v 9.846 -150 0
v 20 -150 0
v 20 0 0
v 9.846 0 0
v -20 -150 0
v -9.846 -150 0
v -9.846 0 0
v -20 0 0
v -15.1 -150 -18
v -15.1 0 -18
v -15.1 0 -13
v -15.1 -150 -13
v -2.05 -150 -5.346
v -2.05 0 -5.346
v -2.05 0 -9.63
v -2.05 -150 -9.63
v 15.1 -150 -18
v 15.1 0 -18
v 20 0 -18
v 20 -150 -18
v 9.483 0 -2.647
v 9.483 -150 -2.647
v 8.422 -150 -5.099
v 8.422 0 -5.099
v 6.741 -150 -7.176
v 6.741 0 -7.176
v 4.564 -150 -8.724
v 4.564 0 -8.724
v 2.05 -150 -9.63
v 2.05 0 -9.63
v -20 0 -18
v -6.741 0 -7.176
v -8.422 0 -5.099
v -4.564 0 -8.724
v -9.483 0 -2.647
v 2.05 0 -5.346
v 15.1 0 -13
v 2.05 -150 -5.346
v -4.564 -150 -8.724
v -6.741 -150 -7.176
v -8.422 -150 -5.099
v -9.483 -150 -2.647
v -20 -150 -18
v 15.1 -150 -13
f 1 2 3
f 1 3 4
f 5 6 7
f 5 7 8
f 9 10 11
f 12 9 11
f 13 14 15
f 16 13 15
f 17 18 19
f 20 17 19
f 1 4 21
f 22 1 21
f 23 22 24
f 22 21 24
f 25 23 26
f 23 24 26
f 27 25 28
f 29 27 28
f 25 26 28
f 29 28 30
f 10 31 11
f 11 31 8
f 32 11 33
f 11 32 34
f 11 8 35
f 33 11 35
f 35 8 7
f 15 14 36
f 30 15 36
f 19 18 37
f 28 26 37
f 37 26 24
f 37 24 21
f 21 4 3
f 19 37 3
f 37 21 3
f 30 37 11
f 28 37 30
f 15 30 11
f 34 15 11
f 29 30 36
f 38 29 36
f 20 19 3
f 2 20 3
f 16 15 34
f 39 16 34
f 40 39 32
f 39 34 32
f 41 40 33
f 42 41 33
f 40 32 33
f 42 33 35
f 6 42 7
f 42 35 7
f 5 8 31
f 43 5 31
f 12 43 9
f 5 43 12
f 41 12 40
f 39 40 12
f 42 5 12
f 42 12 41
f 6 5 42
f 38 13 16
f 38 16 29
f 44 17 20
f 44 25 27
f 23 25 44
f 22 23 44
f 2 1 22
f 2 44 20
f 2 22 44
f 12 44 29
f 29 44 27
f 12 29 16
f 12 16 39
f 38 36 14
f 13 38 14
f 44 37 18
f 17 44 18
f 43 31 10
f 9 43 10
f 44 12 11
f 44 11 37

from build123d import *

# Parameters (mm, degrees)
F1_DEPTH = 150


with BuildPart() as f1:
    # F0 (on Front) → F1 (new body)
    with BuildSketch(Plane.XZ):
        with BuildLine():
            Line((15.1, -18), (20, -18))
            Line((20, -18), (20, 0))
            Line((20, 0), (9.84551, 0))
            ThreePointArc((9.84551, 0), (7.652364, -6.194787), (2.05, -9.629723))
            Line((2.05, -9.629723), (2.05, -5.346))
            Line((2.05, -5.346), (-2.05, -5.346))
            Line((-2.05, -5.346), (-2.05, -9.629723))
            ThreePointArc((-2.05, -9.629723), (-7.652364, -6.194787), (-9.84551, 0))
            Line((-9.84551, 0), (-20, 0))
            Line((-20, 0), (-20, -18))
            Line((-20, -18), (-15.1, -18))
            Line((-15.1, -18), (-15.1, -13))
            Line((-15.1, -13), (15.1, -13))
            Line((15.1, -13), (15.1, -18))
        make_face()
    extrude(amount=F1_DEPTH)


solid = f1.part
